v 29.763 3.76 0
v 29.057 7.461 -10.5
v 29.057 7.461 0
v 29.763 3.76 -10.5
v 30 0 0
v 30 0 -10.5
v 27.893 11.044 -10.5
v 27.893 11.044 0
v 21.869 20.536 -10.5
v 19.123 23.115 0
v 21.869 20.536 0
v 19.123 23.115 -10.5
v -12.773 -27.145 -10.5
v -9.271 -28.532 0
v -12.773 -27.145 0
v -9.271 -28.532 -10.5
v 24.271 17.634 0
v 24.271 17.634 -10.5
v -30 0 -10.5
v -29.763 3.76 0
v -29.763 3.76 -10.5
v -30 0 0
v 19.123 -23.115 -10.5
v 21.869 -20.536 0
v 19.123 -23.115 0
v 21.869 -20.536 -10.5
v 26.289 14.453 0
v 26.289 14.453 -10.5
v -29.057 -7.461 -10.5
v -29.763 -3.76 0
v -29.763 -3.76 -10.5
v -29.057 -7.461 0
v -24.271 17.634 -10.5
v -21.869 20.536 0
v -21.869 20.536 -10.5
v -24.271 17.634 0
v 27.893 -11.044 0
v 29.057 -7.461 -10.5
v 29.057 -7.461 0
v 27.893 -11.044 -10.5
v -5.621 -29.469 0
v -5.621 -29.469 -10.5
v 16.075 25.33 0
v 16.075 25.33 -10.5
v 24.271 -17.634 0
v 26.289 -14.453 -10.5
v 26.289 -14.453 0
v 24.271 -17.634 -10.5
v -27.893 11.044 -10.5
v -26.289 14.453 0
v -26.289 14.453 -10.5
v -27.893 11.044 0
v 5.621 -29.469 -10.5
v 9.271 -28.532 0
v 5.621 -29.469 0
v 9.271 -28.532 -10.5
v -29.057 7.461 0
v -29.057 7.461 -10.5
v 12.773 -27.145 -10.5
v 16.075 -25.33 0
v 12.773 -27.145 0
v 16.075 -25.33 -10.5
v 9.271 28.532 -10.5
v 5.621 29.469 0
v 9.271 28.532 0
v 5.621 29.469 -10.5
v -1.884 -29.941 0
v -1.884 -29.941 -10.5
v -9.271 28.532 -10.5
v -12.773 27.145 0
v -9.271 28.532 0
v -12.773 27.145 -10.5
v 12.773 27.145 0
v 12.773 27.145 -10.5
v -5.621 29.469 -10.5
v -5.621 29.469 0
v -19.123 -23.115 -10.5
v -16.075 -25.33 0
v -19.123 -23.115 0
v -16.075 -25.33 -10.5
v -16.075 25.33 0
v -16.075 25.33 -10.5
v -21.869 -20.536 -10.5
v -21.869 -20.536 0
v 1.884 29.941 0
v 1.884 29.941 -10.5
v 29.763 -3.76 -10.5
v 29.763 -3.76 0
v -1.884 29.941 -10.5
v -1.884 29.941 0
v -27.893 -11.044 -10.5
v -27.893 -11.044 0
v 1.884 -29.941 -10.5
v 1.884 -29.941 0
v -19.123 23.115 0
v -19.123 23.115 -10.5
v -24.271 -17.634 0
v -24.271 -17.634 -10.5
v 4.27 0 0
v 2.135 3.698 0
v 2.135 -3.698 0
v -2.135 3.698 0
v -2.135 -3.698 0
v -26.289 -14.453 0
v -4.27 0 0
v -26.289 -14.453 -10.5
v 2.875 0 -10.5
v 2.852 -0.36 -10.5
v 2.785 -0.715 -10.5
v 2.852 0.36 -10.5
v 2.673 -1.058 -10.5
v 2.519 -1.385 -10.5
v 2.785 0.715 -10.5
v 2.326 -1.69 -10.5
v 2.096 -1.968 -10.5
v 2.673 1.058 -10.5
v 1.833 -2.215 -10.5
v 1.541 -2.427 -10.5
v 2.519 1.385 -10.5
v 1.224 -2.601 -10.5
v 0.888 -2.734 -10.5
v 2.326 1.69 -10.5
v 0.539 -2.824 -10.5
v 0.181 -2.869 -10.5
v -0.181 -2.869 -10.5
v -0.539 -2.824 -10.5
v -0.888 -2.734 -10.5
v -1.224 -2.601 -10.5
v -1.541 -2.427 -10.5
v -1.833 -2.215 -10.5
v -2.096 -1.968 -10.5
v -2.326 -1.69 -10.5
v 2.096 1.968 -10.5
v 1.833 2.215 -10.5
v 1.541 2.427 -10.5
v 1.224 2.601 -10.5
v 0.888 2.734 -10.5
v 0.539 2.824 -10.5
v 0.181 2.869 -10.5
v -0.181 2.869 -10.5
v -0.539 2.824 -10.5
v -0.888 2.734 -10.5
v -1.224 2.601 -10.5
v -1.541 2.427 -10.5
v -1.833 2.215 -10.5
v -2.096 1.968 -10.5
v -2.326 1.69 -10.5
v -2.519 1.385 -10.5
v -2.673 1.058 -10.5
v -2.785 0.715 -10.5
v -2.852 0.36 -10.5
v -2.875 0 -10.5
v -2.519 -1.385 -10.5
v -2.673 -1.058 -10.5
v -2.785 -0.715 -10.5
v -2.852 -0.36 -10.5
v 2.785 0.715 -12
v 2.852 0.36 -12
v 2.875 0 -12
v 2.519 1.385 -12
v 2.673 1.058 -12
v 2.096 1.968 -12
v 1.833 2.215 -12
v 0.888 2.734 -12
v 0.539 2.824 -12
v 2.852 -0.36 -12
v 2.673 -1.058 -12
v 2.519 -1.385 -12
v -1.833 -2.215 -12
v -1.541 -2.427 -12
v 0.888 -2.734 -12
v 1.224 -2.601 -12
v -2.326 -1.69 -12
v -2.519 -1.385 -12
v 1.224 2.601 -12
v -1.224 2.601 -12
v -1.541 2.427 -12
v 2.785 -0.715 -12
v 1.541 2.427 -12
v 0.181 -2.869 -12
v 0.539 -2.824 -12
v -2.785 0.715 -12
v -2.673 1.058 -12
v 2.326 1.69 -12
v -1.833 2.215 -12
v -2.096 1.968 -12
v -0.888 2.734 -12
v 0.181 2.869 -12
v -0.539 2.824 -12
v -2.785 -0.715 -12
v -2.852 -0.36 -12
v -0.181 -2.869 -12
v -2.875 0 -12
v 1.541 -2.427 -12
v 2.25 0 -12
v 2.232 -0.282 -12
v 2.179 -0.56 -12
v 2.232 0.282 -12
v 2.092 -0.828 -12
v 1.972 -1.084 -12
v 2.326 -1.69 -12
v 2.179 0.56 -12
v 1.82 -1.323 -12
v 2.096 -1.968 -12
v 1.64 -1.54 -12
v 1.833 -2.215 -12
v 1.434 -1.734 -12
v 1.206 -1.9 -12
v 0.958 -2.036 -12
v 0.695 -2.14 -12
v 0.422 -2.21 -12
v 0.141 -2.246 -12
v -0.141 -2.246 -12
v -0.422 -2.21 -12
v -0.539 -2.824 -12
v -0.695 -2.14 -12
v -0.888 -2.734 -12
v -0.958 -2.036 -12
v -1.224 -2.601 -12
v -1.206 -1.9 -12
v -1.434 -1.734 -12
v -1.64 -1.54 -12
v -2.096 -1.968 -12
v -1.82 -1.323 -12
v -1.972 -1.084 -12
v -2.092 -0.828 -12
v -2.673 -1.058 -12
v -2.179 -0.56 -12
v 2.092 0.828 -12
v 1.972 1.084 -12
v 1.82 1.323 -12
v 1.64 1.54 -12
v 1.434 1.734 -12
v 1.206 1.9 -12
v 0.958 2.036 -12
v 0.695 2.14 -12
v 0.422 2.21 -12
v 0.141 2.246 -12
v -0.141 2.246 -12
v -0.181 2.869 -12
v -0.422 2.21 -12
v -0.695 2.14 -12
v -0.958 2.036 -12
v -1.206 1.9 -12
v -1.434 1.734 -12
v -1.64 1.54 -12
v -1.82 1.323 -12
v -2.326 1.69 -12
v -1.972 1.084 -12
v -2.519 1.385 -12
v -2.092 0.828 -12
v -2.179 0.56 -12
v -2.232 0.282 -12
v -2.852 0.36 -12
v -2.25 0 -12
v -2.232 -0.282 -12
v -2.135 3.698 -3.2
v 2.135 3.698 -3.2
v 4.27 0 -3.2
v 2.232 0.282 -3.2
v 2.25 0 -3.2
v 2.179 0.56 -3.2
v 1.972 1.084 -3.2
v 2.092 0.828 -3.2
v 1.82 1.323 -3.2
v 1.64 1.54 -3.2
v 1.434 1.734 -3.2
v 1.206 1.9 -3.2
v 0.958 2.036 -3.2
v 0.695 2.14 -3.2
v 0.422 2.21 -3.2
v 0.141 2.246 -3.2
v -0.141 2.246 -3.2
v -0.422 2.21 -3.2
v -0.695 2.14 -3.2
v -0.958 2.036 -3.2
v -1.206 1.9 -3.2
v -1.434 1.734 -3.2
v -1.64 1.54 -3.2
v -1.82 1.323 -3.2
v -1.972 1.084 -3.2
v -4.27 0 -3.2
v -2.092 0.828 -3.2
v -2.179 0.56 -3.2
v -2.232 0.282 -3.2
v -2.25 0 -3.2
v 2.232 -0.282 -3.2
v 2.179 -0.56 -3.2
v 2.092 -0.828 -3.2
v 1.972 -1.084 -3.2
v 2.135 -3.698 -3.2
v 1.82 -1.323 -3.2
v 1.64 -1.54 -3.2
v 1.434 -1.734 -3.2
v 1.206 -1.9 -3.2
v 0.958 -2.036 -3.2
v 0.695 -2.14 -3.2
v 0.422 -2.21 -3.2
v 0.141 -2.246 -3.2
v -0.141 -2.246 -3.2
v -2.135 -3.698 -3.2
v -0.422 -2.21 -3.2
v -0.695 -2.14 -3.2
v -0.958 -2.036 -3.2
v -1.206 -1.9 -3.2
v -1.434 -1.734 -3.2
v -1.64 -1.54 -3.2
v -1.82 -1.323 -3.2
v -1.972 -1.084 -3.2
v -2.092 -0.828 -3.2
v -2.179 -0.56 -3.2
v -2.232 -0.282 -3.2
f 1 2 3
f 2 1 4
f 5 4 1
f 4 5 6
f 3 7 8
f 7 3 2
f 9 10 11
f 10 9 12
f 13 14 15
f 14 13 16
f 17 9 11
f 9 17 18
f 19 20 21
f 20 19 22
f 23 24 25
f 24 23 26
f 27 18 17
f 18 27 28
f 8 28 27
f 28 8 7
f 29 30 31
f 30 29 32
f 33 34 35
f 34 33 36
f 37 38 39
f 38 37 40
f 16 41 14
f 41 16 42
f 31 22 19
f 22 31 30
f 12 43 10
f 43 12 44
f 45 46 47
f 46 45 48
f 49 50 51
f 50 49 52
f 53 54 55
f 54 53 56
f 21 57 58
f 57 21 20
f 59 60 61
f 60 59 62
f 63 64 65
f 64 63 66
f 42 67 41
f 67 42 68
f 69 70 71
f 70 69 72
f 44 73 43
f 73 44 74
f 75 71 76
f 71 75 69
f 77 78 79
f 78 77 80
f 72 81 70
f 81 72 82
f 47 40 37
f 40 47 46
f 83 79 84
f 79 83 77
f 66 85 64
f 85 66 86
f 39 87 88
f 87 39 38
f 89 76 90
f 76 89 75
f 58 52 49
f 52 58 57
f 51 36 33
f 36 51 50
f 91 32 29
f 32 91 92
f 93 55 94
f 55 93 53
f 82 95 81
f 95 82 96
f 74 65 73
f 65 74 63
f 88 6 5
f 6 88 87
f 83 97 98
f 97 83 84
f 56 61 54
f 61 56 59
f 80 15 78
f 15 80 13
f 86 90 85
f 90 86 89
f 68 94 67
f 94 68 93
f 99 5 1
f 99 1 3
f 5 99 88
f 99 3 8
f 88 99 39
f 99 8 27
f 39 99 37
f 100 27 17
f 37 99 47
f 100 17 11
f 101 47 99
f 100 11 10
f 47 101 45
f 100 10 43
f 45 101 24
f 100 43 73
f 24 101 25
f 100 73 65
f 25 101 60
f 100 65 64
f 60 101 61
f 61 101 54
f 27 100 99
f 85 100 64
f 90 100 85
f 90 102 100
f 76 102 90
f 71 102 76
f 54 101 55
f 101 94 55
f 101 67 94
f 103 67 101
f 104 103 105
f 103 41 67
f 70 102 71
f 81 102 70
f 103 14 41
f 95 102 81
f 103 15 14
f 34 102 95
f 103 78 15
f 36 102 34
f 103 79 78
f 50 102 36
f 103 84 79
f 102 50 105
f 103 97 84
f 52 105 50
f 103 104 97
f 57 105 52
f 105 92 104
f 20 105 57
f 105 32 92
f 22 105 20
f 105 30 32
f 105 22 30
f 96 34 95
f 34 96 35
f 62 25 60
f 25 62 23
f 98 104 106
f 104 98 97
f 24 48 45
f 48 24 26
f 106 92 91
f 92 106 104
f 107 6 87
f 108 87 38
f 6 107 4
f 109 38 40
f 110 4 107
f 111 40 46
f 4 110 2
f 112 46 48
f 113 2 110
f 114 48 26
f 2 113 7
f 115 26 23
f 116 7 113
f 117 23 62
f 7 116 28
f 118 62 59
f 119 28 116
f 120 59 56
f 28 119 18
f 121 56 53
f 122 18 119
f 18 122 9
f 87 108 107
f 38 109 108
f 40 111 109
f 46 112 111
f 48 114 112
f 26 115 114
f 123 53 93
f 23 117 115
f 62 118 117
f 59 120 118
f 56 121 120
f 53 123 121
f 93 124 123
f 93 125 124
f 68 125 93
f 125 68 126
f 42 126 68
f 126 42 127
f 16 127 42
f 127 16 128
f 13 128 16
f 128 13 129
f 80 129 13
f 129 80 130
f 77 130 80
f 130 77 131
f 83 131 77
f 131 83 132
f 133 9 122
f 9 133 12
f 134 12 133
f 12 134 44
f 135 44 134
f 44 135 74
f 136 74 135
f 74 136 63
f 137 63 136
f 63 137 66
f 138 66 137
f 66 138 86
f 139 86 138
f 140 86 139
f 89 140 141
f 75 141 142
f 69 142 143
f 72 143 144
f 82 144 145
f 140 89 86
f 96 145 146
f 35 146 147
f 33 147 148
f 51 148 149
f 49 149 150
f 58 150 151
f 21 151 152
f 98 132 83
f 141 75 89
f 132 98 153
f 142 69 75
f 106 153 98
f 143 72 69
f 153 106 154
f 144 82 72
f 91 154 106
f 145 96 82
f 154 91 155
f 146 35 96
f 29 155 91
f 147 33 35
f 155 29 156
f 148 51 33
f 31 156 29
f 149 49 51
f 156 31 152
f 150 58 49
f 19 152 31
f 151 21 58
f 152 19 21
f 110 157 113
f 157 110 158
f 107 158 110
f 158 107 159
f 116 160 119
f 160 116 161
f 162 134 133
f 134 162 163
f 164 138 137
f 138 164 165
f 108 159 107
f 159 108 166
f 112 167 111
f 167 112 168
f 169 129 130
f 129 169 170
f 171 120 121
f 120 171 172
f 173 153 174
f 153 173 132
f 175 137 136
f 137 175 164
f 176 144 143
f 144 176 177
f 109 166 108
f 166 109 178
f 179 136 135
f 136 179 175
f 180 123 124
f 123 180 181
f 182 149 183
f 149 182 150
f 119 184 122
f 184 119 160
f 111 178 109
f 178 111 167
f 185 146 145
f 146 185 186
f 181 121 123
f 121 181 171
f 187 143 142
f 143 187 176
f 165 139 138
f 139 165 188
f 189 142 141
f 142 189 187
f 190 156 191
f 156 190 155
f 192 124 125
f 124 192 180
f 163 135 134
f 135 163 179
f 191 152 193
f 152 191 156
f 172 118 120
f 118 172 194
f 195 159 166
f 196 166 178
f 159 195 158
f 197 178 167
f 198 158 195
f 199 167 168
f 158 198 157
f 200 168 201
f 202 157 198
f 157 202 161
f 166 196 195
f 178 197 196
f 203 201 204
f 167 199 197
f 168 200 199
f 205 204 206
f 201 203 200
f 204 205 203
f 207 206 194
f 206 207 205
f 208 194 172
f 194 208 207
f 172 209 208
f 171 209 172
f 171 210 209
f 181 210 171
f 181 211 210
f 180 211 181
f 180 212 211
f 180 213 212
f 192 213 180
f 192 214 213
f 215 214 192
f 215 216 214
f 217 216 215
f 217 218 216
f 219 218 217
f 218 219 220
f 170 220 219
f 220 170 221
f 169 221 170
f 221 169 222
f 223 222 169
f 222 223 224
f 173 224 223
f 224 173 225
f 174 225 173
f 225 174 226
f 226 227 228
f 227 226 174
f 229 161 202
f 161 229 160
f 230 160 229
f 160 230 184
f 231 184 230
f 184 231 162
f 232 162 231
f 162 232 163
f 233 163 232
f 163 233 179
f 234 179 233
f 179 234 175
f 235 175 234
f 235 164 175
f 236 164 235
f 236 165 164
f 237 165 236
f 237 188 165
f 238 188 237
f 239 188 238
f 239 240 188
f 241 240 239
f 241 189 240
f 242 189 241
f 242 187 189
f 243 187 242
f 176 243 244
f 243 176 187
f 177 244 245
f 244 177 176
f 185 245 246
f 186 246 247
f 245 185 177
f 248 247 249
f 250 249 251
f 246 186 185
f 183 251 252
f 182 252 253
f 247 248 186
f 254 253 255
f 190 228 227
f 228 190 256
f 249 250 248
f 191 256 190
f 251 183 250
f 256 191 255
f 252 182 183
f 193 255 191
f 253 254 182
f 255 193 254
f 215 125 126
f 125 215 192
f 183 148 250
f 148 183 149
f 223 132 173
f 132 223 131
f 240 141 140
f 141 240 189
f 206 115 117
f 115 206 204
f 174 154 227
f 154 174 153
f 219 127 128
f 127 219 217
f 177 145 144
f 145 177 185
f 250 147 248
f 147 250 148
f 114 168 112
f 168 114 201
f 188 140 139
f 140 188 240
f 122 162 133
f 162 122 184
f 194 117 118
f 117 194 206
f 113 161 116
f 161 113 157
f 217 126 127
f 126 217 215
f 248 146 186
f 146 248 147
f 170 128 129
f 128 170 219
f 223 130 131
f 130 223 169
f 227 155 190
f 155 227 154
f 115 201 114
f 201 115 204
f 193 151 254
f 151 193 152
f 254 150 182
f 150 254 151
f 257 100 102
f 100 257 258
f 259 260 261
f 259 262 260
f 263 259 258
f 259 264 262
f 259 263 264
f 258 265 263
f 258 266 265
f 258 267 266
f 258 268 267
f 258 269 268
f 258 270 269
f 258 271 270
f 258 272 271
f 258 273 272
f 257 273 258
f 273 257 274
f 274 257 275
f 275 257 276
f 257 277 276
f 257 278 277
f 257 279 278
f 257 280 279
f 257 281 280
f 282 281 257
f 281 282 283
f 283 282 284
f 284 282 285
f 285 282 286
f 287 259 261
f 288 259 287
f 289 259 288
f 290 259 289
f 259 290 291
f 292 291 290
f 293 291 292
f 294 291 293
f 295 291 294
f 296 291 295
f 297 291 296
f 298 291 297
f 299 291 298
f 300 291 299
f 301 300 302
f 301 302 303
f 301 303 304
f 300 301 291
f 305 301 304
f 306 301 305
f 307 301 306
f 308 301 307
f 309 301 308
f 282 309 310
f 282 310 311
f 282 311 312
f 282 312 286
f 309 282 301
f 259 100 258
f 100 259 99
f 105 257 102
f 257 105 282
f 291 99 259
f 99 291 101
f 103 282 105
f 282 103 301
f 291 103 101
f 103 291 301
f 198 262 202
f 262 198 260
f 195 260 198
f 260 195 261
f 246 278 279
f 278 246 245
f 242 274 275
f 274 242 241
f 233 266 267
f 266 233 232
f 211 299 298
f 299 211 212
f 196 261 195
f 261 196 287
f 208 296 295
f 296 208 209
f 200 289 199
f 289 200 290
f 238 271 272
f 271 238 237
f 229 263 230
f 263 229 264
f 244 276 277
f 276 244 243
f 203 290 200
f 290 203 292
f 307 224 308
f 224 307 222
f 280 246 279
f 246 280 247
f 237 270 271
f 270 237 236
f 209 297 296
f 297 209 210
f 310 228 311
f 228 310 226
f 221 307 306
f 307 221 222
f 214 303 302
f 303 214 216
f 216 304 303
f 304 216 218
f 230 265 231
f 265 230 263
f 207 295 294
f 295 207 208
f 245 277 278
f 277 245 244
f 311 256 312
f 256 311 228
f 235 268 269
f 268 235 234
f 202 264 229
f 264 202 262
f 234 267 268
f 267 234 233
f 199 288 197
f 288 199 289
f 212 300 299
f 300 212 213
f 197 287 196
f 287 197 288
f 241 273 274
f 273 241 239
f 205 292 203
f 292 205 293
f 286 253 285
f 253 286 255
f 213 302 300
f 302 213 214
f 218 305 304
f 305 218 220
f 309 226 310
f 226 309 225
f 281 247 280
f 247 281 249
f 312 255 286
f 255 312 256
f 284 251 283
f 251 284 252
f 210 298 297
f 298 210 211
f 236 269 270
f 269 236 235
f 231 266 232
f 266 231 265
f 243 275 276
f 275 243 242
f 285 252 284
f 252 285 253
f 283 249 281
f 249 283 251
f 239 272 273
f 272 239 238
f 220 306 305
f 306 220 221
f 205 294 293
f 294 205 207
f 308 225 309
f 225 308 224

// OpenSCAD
$fn = 50;


difference() {
	union() {
		translate(v = [0, 0, -10.5000000000]) {
			cylinder(h = 10.5000000000, r = 30.0000000000);
		}
		#translate(v = [0, 0, -12.0000000000]) {
			cylinder(h = 12, r = 2.8750000000);
		}
	}
	union() {
		translate(v = [0, 0, 0]) {
			rotate(a = [0, 0, 0]) {
				difference() {
					union() {
						translate(v = [0, 0, -3.2000000000]) {
							linear_extrude(height = 3.2000000000) {
								polygon(points = [[4.2698000000, 0.0000000000], [2.1349000000, 3.6977552691], [-2.1349000000, 3.6977552691], [-4.2698000000, 0.0000000000], [-2.1349000000, -3.6977552691], [2.1349000000, -3.6977552691]]);
							}
						}
					}
					union();
				}
			}
		}
		#translate(v = [0, 0, -100.0000000000]) {
			cylinder(h = 200, r = 2.2500000000);
		}
	}
}
